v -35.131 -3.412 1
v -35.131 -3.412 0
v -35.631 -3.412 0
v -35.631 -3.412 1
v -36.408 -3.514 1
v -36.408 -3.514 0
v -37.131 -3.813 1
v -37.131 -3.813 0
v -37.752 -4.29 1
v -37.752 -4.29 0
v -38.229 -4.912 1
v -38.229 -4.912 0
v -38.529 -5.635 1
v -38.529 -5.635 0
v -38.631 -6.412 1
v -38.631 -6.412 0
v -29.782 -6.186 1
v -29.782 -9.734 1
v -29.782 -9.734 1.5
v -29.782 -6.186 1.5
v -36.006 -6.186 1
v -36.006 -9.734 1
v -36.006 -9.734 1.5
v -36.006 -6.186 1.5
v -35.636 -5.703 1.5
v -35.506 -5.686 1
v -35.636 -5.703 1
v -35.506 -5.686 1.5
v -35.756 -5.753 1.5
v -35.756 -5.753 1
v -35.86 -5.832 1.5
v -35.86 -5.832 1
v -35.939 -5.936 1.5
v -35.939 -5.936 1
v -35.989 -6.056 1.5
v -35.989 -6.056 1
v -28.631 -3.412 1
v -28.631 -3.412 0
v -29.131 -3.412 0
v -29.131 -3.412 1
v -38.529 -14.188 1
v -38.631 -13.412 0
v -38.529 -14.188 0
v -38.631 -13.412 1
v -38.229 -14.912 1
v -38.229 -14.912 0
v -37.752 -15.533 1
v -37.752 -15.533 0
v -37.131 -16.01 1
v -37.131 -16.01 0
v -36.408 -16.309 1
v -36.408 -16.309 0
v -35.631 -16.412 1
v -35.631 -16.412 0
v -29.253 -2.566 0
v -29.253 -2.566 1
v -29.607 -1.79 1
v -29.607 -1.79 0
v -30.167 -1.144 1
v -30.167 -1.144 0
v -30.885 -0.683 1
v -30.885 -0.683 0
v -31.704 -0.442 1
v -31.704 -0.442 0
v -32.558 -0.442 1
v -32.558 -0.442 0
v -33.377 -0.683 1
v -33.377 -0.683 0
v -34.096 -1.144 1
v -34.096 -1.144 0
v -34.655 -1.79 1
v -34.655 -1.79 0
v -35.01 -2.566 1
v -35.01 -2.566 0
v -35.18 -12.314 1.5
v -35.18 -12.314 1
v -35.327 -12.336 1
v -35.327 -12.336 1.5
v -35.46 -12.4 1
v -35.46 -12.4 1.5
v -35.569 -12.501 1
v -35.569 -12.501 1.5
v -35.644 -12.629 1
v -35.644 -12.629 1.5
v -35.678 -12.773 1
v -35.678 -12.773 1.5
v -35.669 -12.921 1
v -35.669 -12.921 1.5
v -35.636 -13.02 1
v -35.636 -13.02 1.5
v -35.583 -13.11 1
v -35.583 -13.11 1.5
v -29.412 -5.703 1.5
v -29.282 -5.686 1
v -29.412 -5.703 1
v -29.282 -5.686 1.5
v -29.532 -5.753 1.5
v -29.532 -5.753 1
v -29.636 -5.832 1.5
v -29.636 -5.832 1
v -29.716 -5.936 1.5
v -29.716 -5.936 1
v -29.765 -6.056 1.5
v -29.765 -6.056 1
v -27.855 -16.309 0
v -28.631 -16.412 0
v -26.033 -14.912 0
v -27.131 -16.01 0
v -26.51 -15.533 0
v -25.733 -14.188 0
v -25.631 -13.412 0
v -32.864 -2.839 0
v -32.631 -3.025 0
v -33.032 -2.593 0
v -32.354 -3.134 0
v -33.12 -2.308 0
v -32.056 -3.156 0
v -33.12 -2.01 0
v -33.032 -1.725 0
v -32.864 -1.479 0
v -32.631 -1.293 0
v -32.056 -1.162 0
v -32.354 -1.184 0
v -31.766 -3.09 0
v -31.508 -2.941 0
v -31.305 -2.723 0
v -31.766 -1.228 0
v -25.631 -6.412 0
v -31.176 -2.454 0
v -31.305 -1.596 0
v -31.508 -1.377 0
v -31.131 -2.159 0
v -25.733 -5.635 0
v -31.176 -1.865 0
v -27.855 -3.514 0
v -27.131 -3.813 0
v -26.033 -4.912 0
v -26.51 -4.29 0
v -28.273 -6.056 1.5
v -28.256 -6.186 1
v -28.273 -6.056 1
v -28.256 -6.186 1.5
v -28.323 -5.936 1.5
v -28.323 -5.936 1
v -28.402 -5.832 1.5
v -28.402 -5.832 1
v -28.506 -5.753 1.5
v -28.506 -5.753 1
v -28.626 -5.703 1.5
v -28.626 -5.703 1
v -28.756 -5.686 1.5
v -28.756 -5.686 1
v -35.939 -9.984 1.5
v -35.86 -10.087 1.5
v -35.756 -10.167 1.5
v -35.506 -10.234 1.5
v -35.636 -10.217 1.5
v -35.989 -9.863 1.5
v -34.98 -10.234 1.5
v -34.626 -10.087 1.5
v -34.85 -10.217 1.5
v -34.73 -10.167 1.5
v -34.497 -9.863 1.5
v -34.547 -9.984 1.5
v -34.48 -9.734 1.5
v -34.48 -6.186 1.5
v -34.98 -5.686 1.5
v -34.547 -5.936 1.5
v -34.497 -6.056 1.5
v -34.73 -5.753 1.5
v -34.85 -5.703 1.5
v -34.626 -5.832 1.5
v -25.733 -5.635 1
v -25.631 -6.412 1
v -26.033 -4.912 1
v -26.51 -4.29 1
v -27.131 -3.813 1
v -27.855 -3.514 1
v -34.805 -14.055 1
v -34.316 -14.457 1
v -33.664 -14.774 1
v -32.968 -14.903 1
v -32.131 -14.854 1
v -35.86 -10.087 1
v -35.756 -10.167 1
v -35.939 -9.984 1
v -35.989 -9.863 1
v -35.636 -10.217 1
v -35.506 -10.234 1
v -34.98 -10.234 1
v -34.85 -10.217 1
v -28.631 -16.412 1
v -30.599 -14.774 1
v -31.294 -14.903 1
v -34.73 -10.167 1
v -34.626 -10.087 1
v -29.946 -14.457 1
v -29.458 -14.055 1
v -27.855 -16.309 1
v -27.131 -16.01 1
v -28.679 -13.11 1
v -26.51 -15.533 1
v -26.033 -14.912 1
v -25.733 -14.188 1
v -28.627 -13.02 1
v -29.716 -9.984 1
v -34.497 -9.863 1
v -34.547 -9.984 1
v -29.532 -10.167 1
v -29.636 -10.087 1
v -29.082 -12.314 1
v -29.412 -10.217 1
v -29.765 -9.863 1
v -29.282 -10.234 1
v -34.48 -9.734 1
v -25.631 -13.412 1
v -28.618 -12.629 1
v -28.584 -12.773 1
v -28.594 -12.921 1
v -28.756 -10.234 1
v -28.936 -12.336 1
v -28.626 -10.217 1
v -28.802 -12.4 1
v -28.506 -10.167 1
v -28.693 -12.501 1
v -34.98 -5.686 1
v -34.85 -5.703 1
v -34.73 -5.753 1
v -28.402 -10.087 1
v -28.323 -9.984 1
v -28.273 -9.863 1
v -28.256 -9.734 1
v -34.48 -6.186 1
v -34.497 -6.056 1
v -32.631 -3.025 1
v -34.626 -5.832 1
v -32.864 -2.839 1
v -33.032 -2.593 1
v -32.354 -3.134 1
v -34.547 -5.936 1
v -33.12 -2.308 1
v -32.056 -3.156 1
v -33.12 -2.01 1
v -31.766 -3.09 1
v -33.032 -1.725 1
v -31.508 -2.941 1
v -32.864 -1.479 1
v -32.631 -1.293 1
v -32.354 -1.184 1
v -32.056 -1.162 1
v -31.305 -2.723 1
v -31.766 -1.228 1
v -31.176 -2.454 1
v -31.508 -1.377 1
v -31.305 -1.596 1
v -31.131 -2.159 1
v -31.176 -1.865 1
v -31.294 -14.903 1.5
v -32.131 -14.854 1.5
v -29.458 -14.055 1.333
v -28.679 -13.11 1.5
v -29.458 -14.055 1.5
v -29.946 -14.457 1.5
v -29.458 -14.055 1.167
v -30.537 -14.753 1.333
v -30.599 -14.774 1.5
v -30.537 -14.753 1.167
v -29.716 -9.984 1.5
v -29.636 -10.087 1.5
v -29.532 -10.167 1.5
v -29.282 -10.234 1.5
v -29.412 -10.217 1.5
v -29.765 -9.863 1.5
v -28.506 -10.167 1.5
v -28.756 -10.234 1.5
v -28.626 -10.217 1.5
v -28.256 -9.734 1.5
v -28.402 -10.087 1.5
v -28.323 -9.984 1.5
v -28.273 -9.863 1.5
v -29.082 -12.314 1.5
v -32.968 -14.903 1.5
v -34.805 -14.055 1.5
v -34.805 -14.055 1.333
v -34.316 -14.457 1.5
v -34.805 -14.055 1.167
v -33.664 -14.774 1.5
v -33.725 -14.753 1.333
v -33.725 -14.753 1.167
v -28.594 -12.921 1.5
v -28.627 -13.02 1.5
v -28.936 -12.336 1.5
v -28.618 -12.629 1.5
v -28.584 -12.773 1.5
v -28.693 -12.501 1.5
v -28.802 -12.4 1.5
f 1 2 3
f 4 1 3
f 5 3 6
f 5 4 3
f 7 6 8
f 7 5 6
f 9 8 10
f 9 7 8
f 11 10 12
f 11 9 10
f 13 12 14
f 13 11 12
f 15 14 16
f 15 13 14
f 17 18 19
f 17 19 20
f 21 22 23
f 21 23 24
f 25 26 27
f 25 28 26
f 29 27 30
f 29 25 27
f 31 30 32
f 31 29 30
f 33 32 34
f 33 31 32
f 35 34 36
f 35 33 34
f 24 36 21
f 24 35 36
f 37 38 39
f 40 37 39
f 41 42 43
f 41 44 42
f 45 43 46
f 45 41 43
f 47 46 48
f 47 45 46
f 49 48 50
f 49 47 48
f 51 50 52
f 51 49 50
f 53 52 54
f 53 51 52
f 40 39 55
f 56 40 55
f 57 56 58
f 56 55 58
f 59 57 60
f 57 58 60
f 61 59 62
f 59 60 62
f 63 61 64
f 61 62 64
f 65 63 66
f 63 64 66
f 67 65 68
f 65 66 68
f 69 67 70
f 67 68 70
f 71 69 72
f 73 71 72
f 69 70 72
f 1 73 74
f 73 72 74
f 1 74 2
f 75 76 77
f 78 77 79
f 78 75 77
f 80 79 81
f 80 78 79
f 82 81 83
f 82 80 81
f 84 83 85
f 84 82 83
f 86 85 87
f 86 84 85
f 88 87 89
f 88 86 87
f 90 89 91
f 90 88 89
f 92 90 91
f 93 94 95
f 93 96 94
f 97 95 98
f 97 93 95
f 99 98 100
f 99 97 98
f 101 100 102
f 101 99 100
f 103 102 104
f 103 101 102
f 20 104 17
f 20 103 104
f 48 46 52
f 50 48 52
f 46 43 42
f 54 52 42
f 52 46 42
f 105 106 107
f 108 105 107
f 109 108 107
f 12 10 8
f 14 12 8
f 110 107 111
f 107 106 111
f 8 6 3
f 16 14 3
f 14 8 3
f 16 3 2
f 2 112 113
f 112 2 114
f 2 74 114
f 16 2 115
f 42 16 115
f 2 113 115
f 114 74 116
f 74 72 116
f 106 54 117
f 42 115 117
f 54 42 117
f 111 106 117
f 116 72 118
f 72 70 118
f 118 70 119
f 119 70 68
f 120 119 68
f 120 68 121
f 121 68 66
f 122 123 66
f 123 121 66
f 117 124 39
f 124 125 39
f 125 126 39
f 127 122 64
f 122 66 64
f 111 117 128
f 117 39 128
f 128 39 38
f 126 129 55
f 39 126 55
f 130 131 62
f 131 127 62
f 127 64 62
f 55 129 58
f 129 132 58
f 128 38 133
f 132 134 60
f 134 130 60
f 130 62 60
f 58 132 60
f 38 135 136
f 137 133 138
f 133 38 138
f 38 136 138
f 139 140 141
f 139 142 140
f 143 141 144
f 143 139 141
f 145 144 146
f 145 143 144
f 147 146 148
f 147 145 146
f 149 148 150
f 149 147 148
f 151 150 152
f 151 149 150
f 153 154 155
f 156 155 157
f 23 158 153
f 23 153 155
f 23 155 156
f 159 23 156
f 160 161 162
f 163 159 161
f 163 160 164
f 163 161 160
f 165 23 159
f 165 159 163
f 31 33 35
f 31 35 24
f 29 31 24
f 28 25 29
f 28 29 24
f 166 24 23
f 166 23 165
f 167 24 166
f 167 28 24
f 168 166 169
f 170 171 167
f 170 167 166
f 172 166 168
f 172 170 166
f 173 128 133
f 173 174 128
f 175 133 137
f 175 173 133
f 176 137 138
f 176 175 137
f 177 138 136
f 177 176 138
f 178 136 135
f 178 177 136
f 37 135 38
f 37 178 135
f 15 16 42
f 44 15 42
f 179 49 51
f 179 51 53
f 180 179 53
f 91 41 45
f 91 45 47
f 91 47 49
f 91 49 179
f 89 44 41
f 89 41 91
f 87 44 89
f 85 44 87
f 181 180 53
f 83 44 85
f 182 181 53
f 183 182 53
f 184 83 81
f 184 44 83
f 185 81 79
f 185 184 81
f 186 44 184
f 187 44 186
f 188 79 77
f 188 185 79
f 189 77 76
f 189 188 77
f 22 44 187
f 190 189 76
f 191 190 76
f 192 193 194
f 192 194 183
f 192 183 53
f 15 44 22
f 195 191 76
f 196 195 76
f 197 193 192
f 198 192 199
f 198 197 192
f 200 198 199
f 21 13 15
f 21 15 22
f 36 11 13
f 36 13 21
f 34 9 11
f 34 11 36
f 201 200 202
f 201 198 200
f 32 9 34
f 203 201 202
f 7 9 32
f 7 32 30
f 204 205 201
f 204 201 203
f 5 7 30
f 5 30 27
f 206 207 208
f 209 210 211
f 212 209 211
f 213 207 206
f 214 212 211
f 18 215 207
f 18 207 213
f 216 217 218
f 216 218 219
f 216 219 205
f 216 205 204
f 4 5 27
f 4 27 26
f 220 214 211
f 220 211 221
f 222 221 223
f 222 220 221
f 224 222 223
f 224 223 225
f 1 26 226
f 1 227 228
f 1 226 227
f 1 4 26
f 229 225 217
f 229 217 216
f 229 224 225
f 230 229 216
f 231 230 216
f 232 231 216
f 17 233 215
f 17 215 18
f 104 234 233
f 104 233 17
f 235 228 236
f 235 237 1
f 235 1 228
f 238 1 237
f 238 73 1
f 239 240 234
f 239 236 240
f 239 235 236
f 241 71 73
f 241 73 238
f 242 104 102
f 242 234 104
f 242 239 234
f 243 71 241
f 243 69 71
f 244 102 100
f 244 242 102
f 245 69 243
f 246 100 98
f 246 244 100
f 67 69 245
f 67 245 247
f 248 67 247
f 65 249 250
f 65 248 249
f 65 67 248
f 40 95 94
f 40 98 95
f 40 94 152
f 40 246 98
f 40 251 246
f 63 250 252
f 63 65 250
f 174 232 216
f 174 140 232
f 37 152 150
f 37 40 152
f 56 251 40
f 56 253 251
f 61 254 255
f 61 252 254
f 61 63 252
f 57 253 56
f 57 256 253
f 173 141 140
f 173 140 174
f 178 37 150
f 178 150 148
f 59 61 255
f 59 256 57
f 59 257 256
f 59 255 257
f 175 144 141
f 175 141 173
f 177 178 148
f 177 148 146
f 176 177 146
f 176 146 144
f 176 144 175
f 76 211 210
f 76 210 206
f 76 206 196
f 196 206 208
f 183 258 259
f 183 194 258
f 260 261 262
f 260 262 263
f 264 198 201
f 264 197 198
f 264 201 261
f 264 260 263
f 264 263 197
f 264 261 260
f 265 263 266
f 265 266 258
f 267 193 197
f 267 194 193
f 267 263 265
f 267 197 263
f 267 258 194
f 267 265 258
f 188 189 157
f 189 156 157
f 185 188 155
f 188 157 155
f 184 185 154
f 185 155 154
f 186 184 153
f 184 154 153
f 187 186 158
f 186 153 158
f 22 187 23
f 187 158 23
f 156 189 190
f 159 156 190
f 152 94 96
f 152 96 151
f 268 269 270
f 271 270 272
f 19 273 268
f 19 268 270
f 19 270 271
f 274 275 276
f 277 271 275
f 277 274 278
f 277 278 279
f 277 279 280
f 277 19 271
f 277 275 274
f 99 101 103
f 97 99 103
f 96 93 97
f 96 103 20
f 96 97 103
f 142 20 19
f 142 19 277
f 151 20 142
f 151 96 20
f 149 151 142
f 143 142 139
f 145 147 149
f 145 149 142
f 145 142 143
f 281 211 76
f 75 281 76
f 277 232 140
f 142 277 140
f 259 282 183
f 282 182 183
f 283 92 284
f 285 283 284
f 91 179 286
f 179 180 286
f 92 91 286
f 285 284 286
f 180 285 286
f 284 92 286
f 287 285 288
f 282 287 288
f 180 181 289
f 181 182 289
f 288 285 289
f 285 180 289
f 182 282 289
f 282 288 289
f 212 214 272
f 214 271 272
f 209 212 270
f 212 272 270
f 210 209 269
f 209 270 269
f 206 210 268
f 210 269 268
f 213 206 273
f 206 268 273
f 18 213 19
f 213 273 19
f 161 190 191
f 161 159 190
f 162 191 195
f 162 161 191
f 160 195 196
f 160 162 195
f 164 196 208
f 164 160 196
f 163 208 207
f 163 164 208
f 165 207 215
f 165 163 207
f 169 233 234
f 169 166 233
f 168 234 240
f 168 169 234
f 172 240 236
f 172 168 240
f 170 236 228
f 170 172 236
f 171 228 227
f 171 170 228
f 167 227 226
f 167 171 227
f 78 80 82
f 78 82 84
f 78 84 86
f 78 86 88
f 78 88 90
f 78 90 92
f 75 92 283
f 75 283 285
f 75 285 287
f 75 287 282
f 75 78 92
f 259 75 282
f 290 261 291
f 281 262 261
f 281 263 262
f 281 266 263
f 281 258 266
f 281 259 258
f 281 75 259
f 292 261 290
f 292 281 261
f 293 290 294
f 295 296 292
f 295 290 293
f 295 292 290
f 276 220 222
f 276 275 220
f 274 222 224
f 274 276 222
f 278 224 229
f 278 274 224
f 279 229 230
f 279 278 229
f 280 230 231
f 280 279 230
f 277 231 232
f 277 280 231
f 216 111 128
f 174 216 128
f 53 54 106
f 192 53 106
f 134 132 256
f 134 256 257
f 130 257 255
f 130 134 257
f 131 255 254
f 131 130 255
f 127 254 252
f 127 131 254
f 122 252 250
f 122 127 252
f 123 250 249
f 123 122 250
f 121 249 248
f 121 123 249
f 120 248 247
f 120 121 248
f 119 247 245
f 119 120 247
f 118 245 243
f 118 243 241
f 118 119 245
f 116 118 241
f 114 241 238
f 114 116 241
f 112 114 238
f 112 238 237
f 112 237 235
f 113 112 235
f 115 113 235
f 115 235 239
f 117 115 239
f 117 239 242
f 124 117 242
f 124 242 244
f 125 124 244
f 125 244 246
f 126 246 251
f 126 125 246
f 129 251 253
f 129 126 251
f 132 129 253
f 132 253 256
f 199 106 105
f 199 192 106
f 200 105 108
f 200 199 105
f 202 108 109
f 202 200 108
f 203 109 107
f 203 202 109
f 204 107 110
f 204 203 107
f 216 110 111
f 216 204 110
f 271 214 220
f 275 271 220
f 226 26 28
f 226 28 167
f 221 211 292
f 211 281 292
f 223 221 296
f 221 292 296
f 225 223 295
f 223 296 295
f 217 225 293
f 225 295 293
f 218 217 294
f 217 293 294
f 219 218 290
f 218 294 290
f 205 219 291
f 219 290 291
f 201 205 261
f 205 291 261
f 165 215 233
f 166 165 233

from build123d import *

# Parameters (mm, degrees)
F0_R     = 1
F1_DEPTH = 1
F2_R     = 3
F3_W     = 1.5266574919
F3_H     = 4.5481626876
F4_DEPTH = 0.5
F5_R     = 0.5


with BuildPart() as f1:
    # F0 (on Top) → F1 (new body)
    with BuildSketch(Plane.XY):
        with BuildLine():
            ThreePointArc((-35.1311429143, -3.4115522057), (-32.1311429143, -6.4115522057), (-29.1311429143, -3.4115522057))
            Line((-29.1311429143, -3.4115522057), (-35.1311429143, -3.4115522057))
        make_face()
        with BuildLine():
            Line((-35.1311429143, -3.4115522057), (-29.1311429143, -3.4115522057))
            ThreePointArc((-29.1311429143, -3.4115522057), (-32.1311429143, -0.4115522057), (-35.1311429143, -3.4115522057))
        make_face()
        with Locations((-32.1311429143, -2.1592592821)):
            Circle(F0_R, mode=Mode.SUBTRACT)
        with BuildLine():
            Line((-25.6311429143, -3.4115522057), (-29.1311429143, -3.4115522057))
            ThreePointArc((-29.1311429143, -3.4115522057), (-32.1311429143, -6.4115522057), (-35.1311429143, -3.4115522057))
            Line((-35.1311429143, -3.4115522057), (-38.6311429143, -3.4115522057))
            Line((-38.6311429143, -3.4115522057), (-38.6311429143, -16.4115522057))
            Line((-38.6311429143, -16.4115522057), (-25.6311429143, -16.4115522057))
            Line((-25.6311429143, -16.4115522057), (-25.6311429143, -3.4115522057))
        make_face()
    extrude(amount=F1_DEPTH)

    # F2
    f2_edges = [f1.edges().sort_by_distance(p)[0] for p in [
        (-25.631143, -3.411552, 0.5),
        (-25.631143, -16.411552, 0.5),
        (-38.631143, -3.411552, 0.5),
        (-38.631143, -16.411552, 0.5),
    ]]
    fillet(f2_edges, radius=F2_R)

    # F3 (on face) → F4 (join)
    with BuildSketch(Plane.XY.offset(1)):
        with Locations((-35.2431219071, -7.959790295)):
            Rectangle(F3_W, F3_H)
        with Locations((-29.0191639215, -7.959790295)):
            Rectangle(F3_W, F3_H)
        with BuildLine():
            Line((-28.0351451192, -12.3141705765), (-32.1311429143, -12.3141705765))
            Line((-32.1311429143, -12.3141705765), (-32.1311429143, -14.8540753871))
            add(Edge.make_bspline(
                [(-28.0351451192, -12.3141705765), (-28.9659189681, -13.232003587), (-29.6096801758, -15.267544426), (-32.1311429143, -14.8540753871)],
                knots=[0, 0, 0, 0, 4.8195761623, 4.8195761623, 4.8195761623, 4.8195761623], degree=3))
        make_face()
        with BuildLine():
            Line((-32.1311429143, -12.3141705765), (-36.2271407093, -12.3141705765))
            add(Edge.make_bspline(
                [(-36.2271407093, -12.3141705765), (-35.2963668605, -13.232003587), (-34.6526056528, -15.267544426), (-32.1311429143, -14.8540753871)],
                knots=[0, 0, 0, 0, 4.8195761623, 4.8195761623, 4.8195761623, 4.8195761623], degree=3))
            Line((-32.1311429143, -14.8540753871), (-32.1311429143, -12.3141705765))
        make_face()
    extrude(amount=F4_DEPTH)

    # F5
    f5_edges = [f1.edges().sort_by_distance(p)[0] for p in [
        (-36.006451, -5.685709, 1.25),
        (-34.479793, -5.685709, 1.25),
        (-34.479793, -10.233872, 1.25),
        (-36.006451, -10.233872, 1.25),
        (-28.255835, -5.685709, 1.25),
        (-28.255835, -10.233872, 1.25),
        (-29.782493, -5.685709, 1.25),
        (-29.782493, -10.233872, 1.25),
        (-36.227141, -12.314171, 1.25),
        (-28.035145, -12.314171, 1.25),
    ]]
    fillet(f5_edges, radius=F5_R)


solid = f1.part
